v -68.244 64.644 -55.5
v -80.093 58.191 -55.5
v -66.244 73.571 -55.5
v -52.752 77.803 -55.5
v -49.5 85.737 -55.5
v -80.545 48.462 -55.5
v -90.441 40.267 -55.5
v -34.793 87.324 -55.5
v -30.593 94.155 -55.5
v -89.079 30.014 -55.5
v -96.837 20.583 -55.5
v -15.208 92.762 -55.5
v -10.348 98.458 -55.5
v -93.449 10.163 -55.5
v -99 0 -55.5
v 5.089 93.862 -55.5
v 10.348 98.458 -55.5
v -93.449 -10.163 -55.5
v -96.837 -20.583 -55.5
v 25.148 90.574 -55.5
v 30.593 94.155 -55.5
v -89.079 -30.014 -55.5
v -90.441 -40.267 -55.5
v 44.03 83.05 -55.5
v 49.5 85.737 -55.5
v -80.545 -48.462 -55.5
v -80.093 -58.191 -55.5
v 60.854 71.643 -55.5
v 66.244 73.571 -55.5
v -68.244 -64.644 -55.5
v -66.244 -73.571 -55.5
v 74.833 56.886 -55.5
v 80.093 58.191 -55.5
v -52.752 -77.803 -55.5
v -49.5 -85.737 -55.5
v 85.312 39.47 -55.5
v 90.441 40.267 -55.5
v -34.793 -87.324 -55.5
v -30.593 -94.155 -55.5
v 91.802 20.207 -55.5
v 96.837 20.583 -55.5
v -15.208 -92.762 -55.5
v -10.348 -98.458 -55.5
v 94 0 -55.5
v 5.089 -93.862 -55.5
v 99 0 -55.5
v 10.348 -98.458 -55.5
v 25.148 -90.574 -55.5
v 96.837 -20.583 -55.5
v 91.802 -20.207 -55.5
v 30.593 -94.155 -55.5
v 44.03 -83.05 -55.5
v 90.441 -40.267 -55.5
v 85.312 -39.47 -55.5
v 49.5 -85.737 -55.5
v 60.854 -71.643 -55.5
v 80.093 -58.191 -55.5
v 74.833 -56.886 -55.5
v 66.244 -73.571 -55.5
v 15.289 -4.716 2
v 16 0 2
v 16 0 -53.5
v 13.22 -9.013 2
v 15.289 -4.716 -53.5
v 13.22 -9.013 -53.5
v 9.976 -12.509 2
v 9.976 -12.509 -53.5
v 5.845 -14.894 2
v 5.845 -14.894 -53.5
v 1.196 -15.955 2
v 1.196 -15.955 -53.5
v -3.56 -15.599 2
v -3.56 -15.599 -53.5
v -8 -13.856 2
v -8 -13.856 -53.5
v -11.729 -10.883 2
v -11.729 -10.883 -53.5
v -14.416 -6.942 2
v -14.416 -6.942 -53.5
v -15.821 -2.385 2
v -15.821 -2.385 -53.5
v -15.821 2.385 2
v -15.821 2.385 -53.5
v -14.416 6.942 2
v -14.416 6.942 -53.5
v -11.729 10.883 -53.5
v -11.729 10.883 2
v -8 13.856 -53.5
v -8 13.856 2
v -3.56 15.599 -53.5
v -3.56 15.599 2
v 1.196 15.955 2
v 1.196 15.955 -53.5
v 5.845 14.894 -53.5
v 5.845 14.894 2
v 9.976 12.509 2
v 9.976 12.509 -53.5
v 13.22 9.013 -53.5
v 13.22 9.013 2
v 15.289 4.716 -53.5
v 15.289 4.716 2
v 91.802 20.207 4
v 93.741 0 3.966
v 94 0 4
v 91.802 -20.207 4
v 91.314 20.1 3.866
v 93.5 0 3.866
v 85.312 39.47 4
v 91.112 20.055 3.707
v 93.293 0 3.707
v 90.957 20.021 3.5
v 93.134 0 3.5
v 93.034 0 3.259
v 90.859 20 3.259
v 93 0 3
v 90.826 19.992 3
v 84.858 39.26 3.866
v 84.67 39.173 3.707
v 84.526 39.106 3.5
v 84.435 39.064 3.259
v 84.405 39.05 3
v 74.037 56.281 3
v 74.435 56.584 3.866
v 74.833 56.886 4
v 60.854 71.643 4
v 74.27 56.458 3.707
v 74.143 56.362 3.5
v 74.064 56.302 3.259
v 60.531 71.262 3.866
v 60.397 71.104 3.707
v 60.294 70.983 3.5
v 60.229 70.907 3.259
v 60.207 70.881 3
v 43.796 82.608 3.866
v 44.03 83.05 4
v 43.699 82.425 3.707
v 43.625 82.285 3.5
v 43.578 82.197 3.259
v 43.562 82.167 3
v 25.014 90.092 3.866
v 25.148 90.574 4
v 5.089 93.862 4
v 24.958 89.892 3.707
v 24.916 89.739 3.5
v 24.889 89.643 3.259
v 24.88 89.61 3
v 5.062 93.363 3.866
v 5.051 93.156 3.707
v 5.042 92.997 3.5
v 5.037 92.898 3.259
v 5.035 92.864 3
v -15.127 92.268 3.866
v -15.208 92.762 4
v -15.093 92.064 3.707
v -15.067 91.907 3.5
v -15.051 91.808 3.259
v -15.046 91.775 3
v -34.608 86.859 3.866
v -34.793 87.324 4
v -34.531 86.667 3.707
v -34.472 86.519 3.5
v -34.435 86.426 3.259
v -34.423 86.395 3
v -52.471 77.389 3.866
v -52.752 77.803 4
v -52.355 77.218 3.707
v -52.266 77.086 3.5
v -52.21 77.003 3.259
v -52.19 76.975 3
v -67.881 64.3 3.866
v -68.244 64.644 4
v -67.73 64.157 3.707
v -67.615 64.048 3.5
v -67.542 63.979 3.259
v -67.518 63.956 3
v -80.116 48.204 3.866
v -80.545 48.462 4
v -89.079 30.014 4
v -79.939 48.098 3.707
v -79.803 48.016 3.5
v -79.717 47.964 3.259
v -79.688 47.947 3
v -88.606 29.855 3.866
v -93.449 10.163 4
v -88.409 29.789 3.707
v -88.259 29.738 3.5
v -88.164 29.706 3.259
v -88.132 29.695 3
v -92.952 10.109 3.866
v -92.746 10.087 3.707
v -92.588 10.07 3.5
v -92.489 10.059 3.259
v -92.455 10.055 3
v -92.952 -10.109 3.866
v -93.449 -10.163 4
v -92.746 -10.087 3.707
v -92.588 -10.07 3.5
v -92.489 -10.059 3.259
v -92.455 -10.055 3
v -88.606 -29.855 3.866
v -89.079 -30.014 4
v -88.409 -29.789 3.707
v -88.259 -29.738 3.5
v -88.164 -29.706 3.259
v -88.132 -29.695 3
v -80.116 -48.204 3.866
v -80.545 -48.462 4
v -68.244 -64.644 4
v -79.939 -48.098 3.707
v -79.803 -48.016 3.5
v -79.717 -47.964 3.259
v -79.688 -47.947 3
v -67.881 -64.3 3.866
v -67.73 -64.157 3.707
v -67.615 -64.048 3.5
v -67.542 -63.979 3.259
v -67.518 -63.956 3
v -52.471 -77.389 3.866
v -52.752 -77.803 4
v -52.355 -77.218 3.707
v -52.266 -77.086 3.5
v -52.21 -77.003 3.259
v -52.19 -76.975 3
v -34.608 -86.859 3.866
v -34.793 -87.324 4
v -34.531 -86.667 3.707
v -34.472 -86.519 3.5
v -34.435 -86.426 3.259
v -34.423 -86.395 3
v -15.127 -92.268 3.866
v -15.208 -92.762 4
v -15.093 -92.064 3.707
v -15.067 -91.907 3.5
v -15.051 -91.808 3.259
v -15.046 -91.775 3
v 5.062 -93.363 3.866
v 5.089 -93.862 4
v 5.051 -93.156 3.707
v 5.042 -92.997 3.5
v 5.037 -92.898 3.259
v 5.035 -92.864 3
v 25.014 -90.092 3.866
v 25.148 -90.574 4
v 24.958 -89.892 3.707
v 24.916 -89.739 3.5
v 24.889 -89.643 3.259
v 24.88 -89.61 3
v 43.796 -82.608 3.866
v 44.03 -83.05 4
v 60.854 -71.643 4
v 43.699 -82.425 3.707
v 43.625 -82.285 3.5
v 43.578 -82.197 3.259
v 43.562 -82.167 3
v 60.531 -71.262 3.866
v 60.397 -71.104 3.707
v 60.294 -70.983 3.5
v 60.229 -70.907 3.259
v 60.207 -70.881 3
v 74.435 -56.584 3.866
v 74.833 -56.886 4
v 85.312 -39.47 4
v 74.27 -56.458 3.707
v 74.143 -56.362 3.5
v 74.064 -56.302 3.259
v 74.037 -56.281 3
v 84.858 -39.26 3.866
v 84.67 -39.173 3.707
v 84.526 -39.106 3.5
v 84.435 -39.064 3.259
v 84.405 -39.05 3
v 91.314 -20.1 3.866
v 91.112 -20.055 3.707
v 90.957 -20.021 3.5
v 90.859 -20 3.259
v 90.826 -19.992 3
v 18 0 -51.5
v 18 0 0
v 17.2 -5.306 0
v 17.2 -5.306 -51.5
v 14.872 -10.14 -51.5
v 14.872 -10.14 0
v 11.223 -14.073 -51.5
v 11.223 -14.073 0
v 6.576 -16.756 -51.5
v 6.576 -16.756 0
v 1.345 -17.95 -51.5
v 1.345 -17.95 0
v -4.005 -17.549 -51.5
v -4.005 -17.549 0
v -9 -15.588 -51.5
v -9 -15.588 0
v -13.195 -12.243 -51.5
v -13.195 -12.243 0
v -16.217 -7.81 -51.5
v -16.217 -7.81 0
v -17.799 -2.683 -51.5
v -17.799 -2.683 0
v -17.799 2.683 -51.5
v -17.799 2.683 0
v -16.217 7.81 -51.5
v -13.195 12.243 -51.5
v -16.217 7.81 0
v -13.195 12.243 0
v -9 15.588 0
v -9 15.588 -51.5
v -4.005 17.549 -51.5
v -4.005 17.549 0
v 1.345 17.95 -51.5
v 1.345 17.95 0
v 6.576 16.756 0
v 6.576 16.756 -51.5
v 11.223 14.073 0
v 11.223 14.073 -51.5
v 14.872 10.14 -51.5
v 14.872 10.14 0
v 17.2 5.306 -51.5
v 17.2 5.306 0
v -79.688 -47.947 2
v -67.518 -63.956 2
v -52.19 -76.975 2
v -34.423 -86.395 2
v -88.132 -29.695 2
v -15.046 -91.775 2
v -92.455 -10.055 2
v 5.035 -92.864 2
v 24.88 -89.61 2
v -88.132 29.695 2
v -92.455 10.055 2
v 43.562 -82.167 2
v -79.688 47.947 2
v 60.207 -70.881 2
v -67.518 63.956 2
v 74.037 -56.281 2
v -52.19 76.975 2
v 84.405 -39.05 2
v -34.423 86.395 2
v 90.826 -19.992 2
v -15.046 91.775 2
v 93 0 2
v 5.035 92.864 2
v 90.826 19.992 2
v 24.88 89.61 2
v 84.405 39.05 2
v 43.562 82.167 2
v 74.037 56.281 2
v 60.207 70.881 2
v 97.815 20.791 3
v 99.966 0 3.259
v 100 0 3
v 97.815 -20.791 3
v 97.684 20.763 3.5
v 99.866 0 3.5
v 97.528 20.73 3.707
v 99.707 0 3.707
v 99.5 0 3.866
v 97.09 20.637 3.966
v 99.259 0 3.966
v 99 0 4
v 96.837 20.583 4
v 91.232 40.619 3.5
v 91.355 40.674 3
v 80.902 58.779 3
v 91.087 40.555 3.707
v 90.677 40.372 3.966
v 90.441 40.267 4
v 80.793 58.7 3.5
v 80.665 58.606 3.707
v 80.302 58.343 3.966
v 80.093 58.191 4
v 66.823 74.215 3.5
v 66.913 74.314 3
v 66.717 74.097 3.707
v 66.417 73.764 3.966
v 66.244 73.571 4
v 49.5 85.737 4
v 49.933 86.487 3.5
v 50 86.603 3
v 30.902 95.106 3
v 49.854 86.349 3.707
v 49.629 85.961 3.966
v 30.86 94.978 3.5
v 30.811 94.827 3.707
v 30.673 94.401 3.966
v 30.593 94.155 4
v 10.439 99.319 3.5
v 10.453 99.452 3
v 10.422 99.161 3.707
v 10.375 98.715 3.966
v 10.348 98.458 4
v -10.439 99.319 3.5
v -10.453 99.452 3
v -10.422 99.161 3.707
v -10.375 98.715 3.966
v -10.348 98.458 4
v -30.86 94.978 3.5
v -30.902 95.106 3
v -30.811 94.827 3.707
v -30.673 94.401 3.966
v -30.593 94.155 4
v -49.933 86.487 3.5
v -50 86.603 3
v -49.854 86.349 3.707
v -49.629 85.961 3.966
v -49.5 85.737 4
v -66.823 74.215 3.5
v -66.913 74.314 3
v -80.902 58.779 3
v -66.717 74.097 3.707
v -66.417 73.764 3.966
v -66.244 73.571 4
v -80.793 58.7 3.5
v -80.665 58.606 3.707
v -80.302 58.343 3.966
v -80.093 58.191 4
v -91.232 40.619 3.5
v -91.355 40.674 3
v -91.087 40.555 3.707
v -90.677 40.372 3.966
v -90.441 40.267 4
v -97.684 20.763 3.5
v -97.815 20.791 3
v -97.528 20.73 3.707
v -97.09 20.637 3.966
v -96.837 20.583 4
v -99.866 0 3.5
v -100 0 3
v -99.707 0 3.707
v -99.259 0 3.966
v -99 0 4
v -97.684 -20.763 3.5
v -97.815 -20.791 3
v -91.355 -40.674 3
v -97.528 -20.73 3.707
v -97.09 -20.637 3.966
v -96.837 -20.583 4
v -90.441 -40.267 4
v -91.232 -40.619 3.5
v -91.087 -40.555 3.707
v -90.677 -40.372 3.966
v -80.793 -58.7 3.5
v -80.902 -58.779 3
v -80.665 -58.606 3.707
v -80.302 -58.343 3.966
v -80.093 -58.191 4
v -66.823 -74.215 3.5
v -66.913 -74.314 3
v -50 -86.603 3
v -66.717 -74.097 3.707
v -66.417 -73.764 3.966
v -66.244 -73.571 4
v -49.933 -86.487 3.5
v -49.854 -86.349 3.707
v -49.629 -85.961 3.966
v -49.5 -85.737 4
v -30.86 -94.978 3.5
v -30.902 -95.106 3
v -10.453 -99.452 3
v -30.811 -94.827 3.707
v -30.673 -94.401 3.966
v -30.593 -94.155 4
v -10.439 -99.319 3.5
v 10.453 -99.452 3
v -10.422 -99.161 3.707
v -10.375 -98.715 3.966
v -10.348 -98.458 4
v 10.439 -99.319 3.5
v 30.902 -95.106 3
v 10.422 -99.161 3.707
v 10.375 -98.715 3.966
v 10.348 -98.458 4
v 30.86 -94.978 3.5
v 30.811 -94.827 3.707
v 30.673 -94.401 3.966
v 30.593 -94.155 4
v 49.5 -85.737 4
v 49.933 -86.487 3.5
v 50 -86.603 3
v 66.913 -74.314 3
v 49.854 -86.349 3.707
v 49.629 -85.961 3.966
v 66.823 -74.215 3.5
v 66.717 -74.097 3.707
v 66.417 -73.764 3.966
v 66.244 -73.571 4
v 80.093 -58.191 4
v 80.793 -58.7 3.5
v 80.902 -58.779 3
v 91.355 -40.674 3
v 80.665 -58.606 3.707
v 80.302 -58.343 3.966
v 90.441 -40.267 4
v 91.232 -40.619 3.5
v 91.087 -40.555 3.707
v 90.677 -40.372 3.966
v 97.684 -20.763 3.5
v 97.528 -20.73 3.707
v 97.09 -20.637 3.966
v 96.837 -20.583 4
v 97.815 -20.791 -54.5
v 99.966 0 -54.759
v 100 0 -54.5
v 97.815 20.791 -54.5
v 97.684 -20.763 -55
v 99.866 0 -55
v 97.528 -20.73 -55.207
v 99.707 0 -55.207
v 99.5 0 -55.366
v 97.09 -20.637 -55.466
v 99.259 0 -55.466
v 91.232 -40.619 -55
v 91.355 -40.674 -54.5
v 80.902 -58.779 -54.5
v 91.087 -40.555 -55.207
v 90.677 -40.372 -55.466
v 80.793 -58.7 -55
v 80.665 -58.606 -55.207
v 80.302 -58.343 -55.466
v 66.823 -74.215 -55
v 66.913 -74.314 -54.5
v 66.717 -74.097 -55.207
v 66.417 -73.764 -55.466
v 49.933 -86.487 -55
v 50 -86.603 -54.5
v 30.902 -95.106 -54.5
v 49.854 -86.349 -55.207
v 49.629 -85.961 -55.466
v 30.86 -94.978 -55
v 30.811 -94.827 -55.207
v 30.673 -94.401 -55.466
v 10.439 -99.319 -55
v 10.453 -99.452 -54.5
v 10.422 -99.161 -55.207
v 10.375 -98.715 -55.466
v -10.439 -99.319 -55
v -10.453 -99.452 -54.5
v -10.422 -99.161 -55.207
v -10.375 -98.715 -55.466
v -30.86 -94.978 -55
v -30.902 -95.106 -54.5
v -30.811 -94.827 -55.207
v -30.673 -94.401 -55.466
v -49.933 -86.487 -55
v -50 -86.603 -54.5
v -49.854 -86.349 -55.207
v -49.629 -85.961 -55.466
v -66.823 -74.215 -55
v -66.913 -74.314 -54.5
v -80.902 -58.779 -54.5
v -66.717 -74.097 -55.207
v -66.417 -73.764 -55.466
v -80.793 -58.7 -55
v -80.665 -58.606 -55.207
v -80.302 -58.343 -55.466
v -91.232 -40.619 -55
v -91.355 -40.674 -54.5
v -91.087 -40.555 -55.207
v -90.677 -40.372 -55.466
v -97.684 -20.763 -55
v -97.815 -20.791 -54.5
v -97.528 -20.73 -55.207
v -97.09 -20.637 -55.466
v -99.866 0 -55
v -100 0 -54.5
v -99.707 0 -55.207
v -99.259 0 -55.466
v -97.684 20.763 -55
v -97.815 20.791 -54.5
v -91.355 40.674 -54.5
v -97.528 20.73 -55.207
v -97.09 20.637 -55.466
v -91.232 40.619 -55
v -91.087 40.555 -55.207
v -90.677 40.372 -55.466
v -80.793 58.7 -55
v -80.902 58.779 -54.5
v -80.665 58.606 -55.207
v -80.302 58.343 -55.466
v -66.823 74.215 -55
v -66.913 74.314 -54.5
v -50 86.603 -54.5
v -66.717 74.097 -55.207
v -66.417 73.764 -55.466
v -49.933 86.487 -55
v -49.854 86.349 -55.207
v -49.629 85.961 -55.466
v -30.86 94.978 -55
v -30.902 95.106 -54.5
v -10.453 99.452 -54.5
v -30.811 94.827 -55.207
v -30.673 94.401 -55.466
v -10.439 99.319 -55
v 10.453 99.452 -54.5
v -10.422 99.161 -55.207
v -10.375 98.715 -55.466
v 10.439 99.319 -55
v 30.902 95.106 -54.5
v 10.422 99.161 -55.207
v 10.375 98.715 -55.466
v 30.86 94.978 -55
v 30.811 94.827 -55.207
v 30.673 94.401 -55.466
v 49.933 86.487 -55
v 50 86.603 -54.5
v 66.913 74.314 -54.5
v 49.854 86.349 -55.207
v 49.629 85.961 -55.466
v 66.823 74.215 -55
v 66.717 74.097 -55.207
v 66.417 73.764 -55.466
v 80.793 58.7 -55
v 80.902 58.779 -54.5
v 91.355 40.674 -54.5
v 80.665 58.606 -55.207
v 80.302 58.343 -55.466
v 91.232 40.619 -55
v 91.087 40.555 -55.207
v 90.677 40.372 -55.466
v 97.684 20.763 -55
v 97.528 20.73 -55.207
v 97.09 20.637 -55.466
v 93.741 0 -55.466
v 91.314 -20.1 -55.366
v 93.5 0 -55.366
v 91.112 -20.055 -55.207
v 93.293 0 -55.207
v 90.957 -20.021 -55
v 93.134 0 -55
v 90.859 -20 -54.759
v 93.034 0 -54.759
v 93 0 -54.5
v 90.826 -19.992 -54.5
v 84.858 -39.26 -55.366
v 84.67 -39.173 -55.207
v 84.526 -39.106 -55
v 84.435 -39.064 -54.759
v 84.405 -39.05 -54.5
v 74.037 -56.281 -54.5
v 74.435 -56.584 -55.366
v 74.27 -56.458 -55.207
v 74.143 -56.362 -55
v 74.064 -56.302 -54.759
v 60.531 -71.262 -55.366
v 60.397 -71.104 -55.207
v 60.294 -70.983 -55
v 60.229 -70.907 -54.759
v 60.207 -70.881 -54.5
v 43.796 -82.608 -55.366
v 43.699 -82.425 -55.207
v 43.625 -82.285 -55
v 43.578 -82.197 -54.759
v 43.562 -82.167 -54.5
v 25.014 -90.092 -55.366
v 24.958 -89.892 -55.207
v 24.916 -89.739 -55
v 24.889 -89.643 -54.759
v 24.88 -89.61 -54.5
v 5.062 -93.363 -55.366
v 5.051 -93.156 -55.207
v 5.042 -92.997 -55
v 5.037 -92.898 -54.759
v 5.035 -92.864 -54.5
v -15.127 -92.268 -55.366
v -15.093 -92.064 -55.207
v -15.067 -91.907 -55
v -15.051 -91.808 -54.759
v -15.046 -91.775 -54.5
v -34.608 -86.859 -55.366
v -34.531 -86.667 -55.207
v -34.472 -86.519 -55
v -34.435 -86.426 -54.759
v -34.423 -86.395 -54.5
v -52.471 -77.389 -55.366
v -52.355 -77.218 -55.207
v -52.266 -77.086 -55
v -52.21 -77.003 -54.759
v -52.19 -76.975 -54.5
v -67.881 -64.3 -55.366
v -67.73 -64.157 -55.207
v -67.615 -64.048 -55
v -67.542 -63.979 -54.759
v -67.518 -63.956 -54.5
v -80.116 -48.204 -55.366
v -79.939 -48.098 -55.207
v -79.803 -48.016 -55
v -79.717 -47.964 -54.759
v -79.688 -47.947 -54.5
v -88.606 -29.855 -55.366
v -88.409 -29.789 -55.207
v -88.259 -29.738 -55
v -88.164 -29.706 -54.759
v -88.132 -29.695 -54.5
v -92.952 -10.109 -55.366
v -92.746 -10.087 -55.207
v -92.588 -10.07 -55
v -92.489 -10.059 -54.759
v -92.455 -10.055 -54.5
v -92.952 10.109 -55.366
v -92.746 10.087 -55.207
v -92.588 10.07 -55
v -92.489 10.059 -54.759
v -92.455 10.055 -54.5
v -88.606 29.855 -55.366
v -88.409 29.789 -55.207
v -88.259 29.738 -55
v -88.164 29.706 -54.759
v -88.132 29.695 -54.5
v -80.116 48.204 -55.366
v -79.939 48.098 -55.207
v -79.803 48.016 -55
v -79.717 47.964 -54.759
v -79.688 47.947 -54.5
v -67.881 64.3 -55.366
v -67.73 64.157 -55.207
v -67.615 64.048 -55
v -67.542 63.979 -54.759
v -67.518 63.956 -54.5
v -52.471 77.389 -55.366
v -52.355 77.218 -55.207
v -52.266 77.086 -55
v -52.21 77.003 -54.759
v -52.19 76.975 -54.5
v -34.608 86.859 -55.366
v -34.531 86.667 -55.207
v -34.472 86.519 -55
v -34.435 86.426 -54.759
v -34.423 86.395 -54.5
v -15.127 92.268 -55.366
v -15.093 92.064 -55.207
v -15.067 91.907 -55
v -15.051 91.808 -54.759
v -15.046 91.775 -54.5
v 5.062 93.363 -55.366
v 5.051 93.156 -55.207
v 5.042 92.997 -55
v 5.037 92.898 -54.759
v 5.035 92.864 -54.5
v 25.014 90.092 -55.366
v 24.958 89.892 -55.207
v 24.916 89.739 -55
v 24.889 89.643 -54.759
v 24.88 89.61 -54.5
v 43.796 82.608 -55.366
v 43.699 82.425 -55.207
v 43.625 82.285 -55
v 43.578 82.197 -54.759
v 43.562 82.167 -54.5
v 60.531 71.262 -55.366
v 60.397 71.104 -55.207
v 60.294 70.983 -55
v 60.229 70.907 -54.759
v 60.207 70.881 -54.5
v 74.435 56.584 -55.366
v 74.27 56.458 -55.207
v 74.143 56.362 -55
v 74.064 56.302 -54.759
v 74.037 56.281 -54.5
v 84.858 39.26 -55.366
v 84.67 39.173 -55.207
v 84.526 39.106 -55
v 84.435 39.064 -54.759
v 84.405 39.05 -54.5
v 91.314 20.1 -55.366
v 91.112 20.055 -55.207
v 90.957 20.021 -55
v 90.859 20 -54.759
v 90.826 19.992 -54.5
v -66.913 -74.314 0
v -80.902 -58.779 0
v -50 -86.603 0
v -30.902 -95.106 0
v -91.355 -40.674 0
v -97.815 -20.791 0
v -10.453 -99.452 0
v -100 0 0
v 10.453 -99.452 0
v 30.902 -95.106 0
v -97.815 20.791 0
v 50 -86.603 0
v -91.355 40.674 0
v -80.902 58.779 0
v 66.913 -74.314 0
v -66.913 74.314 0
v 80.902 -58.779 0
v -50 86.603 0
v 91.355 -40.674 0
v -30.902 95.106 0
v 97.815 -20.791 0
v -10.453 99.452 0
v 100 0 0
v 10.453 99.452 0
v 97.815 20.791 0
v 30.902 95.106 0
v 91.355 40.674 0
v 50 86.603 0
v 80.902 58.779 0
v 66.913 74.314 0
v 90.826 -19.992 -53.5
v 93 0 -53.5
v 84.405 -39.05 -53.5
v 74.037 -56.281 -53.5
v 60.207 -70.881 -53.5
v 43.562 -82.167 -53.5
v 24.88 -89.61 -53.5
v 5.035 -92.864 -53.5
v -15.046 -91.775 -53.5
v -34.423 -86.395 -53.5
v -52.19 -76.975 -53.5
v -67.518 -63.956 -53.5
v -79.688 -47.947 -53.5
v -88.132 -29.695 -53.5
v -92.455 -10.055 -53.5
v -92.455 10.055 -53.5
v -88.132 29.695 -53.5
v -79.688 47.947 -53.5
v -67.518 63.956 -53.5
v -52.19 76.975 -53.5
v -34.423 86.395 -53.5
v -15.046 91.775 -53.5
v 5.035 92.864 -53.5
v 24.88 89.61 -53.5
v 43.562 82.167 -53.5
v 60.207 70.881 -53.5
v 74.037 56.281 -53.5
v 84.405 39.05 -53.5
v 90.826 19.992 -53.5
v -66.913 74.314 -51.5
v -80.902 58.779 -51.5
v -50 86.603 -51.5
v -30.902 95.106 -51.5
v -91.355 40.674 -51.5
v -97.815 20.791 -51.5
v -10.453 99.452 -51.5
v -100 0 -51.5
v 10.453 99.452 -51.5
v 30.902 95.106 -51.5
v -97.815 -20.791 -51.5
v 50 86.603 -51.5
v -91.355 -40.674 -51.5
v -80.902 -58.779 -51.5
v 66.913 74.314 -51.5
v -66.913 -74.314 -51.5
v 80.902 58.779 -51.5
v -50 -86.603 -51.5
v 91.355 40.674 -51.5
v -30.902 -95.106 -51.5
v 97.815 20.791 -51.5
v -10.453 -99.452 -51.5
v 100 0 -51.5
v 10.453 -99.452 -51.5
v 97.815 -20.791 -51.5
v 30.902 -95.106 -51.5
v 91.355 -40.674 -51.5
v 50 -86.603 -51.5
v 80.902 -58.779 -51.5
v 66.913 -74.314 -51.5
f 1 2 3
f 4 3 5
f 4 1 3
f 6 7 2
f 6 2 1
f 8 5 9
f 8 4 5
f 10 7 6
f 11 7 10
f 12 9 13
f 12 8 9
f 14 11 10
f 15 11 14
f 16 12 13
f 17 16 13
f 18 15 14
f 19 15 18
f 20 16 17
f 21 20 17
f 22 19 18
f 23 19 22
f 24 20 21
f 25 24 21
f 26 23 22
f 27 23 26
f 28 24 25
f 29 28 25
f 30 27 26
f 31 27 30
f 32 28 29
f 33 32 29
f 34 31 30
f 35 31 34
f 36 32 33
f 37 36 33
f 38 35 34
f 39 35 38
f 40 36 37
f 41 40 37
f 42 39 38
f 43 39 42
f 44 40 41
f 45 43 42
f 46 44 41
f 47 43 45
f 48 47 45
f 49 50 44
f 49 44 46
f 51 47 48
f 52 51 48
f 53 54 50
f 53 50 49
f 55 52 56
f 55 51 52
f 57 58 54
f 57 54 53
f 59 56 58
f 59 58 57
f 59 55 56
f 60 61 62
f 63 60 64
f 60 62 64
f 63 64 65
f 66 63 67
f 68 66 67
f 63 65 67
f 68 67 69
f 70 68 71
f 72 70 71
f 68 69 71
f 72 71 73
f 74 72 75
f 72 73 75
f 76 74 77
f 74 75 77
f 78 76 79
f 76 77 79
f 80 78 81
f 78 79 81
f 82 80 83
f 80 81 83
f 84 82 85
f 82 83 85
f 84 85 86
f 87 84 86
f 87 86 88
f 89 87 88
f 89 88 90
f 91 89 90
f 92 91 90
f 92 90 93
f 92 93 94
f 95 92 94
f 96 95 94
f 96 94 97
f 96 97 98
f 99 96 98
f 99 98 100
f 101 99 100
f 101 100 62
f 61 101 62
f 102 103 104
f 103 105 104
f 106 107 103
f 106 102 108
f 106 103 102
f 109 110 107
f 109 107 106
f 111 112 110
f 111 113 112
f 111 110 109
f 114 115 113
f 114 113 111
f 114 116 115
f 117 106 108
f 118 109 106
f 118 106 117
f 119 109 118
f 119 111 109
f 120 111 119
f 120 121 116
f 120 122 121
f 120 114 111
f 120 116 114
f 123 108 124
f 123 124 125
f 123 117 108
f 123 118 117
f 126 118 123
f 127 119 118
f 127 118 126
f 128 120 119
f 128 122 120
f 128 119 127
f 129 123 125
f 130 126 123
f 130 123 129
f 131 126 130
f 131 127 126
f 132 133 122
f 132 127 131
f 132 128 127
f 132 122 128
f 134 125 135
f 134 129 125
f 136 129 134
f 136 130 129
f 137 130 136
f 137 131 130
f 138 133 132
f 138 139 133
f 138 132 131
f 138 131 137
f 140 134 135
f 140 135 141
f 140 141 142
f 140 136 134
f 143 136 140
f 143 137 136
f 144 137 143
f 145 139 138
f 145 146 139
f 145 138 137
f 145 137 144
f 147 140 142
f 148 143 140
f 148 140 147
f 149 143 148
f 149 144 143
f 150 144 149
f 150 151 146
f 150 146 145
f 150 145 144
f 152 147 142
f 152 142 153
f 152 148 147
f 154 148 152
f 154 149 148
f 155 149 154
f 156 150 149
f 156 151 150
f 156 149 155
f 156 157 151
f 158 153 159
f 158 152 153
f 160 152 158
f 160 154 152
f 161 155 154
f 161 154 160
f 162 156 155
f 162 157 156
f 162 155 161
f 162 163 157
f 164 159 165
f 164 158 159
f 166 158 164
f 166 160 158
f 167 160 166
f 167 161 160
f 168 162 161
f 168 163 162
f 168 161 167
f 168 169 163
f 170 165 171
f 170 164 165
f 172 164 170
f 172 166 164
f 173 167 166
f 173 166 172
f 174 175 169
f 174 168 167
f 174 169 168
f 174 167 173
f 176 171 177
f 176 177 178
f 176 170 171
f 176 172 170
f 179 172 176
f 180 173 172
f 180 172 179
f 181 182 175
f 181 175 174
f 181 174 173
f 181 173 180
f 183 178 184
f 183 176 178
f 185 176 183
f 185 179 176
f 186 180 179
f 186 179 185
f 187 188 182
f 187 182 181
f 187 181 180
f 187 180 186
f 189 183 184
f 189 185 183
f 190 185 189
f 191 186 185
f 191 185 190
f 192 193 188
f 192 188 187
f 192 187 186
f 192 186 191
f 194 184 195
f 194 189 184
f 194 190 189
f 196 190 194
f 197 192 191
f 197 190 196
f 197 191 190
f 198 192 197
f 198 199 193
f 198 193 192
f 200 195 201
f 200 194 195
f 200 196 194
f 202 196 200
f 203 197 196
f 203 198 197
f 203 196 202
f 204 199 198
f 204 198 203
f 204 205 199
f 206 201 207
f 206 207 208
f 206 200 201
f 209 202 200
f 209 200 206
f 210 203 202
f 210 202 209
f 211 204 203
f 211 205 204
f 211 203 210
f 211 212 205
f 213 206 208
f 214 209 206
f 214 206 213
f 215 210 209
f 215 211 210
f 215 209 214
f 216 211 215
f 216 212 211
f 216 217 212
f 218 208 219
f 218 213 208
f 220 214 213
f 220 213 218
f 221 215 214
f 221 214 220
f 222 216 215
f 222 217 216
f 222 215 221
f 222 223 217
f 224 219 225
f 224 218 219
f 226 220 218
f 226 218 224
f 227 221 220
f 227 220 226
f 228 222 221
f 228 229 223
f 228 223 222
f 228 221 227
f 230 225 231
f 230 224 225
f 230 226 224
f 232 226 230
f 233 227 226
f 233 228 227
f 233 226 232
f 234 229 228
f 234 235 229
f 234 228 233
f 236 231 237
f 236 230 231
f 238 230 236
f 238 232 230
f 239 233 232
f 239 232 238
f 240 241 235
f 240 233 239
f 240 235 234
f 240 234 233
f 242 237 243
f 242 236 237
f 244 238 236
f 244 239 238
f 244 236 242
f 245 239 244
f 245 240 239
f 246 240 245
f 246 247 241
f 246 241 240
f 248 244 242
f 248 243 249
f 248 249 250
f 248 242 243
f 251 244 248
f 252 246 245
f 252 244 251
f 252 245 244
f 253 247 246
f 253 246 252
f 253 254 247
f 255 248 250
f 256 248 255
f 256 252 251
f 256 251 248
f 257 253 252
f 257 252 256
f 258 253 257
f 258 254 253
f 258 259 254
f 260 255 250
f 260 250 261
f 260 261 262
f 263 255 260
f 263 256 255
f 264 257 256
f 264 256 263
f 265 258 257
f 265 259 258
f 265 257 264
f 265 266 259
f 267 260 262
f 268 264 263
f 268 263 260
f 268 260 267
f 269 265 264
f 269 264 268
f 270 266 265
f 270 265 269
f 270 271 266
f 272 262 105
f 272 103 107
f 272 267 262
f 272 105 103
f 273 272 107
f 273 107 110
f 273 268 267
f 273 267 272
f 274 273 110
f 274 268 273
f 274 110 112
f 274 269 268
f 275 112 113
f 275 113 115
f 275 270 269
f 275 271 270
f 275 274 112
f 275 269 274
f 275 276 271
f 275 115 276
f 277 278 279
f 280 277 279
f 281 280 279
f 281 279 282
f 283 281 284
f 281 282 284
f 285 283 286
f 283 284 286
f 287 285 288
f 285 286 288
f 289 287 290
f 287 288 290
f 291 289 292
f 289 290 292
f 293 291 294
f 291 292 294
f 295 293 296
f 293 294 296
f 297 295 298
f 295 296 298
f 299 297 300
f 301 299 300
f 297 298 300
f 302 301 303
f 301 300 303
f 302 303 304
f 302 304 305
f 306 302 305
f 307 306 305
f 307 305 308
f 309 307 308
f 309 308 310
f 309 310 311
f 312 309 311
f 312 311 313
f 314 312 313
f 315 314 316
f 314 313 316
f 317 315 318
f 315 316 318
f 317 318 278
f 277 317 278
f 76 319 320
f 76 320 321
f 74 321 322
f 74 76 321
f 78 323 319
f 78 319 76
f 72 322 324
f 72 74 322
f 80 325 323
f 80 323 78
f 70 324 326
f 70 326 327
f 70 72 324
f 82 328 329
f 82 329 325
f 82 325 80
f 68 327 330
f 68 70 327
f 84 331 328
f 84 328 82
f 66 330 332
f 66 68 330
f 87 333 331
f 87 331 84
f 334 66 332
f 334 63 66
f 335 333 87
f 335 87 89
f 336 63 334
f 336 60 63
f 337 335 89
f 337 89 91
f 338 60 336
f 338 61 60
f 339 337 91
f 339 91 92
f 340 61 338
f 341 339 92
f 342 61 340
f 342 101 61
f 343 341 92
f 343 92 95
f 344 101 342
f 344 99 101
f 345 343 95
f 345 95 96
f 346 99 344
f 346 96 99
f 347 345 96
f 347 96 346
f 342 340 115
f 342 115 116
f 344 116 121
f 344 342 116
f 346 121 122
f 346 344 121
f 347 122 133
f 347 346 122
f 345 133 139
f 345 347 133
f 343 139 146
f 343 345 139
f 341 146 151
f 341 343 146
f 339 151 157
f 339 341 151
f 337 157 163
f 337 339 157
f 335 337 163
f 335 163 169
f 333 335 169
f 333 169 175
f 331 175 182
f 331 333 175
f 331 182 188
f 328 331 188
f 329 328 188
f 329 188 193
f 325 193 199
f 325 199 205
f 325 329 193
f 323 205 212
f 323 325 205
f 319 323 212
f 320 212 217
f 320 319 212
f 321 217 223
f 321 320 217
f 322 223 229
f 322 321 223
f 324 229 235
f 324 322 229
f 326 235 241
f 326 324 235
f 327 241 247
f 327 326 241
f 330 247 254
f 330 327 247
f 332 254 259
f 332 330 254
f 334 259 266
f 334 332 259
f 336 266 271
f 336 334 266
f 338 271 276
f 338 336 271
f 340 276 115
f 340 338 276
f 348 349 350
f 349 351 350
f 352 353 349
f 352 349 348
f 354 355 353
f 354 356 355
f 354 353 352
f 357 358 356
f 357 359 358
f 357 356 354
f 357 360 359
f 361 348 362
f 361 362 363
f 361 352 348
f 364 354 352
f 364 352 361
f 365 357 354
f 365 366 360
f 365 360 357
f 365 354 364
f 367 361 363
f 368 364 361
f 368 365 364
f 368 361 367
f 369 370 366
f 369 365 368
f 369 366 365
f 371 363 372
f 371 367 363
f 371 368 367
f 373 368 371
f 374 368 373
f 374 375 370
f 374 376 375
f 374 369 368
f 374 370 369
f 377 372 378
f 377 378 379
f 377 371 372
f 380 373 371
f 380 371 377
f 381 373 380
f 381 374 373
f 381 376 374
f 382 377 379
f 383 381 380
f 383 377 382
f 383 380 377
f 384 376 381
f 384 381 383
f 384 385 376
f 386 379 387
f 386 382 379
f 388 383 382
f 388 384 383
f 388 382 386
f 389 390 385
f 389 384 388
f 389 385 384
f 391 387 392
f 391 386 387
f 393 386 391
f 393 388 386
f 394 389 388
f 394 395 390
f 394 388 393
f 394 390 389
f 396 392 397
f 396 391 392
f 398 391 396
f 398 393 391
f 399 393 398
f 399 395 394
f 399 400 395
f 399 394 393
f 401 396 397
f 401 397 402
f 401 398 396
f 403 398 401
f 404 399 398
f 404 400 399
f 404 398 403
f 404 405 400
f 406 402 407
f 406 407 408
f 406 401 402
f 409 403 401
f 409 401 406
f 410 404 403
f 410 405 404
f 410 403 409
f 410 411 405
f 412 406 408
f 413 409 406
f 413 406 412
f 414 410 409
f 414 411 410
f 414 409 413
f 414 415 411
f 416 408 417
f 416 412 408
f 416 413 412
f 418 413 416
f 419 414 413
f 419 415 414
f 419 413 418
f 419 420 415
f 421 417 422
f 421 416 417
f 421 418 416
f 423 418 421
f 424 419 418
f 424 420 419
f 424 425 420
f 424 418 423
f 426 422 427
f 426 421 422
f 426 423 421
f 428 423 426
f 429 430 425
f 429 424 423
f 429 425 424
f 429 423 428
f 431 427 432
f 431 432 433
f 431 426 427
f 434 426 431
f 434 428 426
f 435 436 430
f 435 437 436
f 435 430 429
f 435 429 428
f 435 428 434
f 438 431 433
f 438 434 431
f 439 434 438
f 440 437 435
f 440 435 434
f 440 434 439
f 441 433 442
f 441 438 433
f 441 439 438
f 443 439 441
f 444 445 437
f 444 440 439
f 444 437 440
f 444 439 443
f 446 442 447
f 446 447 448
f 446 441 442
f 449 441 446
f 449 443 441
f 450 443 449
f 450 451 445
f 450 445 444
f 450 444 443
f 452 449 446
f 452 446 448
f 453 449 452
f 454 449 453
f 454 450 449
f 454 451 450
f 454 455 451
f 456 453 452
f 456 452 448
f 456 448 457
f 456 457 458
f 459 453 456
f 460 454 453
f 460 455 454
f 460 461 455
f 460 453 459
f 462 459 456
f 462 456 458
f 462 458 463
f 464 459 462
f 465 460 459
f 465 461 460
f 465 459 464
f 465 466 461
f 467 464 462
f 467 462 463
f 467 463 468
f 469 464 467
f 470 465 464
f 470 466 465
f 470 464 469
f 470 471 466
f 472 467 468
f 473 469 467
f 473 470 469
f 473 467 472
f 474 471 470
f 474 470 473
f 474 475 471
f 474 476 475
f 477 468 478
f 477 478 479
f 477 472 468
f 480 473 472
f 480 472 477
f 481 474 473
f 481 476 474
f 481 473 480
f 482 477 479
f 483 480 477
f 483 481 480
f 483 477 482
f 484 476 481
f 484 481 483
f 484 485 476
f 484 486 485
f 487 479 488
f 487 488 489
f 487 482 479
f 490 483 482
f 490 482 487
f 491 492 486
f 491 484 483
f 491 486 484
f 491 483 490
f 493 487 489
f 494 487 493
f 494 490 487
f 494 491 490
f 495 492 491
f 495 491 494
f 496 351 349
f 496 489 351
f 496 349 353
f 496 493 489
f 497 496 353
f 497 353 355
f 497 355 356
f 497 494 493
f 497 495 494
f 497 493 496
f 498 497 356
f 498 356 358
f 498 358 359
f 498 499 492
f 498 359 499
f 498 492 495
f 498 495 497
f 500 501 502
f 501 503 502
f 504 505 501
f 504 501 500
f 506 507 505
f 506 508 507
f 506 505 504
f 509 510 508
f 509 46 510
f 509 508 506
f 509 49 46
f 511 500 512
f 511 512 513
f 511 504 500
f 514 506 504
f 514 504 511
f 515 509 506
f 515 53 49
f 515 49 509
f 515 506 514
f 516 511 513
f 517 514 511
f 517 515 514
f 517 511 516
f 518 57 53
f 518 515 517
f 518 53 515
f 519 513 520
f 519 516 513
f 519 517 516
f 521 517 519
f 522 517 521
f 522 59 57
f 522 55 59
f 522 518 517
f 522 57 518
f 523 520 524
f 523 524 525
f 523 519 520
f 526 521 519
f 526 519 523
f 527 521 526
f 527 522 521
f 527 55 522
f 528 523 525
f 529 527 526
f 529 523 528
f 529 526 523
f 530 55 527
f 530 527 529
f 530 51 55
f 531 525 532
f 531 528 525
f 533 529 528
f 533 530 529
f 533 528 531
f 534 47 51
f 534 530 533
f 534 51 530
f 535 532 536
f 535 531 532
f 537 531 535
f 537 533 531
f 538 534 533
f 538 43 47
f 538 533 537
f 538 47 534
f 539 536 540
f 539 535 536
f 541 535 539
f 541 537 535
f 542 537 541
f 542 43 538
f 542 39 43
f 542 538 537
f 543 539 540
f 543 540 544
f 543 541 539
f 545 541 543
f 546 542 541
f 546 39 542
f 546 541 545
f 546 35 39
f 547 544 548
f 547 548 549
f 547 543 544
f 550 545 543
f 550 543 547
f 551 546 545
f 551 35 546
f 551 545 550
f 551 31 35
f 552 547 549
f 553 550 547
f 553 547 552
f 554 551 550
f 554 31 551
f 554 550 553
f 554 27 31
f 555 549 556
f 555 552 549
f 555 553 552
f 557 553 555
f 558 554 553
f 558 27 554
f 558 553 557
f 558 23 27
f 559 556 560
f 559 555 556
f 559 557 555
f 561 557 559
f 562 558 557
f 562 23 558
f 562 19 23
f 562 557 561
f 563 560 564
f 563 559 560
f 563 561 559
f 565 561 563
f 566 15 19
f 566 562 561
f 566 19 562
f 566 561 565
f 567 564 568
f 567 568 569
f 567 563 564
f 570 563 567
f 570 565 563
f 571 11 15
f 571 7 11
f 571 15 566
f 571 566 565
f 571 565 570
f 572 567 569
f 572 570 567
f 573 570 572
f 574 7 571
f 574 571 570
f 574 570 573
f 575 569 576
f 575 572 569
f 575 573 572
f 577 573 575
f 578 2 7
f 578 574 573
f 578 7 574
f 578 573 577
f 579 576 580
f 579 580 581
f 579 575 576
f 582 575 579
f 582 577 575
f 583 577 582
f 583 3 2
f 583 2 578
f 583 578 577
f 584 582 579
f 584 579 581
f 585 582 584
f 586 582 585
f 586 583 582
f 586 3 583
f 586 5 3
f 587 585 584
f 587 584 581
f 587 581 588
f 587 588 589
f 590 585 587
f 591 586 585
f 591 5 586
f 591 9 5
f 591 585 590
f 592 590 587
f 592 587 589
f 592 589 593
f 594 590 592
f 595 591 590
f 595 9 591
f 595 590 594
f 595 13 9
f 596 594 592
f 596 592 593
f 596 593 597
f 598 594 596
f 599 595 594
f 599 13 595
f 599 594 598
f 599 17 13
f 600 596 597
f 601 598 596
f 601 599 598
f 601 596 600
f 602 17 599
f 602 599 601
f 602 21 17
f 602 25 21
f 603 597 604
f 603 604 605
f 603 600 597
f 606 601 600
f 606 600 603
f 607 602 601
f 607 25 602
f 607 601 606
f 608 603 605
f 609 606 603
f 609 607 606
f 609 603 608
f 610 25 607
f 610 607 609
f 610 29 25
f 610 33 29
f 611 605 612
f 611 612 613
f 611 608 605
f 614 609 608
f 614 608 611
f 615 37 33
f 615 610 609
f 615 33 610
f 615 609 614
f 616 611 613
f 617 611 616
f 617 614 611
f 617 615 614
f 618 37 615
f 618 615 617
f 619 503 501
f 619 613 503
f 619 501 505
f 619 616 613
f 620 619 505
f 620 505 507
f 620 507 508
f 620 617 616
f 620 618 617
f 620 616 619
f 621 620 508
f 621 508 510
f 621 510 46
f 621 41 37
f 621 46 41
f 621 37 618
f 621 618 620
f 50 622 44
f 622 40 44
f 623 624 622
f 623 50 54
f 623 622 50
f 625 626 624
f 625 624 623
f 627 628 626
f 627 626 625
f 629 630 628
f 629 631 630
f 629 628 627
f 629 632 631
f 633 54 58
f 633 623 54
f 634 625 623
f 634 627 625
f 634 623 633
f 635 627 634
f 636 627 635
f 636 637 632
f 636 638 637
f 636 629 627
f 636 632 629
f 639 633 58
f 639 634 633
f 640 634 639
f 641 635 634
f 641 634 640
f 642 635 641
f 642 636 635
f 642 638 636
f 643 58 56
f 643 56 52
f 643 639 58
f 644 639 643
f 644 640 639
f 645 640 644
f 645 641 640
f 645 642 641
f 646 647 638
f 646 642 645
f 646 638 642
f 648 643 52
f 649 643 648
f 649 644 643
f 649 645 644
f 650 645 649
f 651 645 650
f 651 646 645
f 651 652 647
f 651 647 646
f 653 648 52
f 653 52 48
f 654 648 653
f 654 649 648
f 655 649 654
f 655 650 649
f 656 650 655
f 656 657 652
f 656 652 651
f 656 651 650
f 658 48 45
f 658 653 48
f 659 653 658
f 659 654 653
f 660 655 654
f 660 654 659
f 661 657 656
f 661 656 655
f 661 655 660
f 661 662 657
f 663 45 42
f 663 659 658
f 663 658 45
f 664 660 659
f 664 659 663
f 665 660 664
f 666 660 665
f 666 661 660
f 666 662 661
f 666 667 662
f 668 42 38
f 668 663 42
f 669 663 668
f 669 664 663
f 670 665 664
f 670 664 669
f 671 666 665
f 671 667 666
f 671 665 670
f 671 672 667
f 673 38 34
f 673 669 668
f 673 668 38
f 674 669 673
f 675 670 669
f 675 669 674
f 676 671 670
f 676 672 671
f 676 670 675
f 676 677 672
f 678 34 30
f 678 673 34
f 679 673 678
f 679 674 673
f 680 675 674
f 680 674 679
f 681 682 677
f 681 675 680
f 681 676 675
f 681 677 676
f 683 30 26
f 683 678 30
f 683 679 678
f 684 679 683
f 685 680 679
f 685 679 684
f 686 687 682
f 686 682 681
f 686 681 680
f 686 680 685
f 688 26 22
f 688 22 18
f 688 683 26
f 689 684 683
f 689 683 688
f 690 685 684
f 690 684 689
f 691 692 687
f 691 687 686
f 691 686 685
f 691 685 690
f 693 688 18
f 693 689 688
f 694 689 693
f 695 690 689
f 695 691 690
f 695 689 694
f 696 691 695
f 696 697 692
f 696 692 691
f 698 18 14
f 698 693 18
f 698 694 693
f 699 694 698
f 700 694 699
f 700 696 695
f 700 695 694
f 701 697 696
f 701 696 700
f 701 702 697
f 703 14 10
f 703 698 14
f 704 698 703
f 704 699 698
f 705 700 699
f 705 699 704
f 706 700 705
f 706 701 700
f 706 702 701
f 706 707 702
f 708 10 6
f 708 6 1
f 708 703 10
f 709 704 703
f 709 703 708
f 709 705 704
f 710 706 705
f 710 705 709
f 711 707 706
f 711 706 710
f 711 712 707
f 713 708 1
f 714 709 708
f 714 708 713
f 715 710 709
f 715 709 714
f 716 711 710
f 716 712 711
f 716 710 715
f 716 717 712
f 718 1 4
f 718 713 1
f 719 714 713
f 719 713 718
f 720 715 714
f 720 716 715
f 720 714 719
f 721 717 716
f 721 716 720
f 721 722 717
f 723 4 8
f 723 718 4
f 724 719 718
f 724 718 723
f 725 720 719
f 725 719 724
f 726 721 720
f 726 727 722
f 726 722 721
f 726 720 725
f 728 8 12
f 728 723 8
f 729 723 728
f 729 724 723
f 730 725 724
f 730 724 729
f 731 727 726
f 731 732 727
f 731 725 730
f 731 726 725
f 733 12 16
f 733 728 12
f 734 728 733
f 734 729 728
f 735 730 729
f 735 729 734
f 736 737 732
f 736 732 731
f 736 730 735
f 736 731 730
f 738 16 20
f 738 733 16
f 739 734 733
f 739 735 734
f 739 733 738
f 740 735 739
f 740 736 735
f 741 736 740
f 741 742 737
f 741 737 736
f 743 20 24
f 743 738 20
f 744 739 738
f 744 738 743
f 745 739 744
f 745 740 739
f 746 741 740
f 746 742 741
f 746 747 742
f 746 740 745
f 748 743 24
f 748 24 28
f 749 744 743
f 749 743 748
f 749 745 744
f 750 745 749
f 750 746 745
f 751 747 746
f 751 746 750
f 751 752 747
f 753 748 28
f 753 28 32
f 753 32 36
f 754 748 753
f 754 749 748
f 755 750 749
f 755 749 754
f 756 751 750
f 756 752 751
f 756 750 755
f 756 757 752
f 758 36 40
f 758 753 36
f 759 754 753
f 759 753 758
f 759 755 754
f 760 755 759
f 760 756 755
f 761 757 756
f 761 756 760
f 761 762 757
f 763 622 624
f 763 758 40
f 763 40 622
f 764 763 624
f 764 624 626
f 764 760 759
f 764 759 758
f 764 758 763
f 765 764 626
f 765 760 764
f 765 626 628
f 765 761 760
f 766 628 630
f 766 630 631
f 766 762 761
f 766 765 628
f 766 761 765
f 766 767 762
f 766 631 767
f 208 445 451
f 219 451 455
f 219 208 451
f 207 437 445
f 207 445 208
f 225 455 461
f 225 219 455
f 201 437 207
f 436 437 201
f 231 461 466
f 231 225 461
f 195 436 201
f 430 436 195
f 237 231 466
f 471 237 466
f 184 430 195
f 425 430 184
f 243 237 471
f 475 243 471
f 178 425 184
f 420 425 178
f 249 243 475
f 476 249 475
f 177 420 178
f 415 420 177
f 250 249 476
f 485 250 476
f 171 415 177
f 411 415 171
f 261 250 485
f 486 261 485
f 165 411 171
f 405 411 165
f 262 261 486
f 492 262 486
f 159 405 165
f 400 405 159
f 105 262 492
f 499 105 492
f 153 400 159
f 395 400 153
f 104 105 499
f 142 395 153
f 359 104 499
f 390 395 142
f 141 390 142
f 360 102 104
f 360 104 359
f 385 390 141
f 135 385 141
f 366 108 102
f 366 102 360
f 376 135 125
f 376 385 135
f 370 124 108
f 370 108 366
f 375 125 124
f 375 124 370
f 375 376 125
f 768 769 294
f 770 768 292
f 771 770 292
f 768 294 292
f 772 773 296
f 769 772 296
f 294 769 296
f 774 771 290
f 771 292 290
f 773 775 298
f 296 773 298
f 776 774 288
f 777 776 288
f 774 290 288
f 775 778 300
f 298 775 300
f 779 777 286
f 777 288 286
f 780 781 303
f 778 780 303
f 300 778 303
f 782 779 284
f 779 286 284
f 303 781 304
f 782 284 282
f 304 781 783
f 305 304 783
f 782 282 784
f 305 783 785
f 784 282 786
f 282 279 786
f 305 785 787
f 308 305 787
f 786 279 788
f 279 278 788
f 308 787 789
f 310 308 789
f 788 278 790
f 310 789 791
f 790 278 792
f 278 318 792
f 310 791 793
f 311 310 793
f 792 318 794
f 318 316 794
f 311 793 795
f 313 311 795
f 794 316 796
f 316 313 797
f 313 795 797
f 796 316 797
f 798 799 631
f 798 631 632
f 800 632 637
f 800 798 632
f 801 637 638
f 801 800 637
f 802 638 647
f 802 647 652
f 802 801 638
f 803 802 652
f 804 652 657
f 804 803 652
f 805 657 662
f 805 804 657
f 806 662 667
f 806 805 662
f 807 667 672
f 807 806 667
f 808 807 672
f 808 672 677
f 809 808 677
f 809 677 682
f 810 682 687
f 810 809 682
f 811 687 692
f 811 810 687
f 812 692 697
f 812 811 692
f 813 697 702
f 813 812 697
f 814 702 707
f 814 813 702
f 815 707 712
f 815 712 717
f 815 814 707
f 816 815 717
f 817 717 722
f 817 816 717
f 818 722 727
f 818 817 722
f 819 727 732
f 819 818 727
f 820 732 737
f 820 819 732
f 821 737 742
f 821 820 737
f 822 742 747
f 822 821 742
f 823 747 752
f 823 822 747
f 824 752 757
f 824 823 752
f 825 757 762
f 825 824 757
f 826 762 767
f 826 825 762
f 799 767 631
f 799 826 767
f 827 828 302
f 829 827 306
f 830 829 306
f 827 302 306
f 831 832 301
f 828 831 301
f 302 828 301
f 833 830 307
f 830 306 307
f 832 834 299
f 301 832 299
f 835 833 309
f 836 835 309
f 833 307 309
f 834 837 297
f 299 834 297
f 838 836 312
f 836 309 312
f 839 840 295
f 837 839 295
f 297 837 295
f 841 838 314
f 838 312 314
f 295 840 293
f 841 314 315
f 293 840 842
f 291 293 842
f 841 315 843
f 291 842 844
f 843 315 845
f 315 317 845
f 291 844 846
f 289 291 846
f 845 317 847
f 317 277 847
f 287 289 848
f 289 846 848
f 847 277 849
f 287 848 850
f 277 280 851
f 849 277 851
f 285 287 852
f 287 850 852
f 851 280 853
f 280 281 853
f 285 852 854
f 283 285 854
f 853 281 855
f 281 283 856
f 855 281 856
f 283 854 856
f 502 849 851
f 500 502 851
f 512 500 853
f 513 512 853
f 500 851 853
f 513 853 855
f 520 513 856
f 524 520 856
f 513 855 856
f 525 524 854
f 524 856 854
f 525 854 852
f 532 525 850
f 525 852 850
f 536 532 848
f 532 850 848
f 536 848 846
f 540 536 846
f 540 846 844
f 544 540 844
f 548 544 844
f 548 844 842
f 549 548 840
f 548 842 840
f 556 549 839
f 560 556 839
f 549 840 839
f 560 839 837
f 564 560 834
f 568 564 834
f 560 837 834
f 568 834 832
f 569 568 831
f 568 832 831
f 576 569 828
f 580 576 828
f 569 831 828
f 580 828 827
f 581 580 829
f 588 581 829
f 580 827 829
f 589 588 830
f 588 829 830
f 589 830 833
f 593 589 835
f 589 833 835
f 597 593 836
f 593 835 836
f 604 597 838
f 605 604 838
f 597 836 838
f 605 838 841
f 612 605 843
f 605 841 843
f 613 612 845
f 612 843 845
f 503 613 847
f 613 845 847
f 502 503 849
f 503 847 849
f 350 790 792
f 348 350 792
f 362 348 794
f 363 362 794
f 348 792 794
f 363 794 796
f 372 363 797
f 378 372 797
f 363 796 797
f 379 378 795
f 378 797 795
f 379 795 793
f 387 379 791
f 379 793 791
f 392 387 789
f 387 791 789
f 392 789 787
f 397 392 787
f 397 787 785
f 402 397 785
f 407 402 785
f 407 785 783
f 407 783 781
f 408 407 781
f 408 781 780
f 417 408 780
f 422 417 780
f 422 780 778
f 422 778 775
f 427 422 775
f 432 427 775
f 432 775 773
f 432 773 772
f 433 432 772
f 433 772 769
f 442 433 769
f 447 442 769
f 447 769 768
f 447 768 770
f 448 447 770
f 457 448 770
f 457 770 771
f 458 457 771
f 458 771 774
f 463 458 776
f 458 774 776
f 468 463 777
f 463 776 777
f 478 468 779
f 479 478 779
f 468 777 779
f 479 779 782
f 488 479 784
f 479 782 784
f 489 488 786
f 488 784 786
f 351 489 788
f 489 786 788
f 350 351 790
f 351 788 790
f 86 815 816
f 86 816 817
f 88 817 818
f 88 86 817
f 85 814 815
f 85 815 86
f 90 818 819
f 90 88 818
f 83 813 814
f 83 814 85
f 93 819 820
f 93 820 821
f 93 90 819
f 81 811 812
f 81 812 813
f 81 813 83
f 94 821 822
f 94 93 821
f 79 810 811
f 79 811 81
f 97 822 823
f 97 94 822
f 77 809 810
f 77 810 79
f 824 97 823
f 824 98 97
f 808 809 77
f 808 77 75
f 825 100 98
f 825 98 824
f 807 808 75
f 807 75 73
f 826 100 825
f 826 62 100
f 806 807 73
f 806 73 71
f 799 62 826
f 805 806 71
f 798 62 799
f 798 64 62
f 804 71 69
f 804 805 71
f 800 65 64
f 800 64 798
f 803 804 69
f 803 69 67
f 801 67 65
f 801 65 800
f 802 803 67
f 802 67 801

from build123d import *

# Parameters (mm, degrees)
F0_R      = 100
F1_DEPTH  = 2
F2_R      = 100
F2_R_2    = 93
F3_DEPTH  = 2
F4_R      = 18
F5_DEPTH  = 51.5
F6_R      = 100
F7_DEPTH  = 2
F8_R      = 100
F8_R_2    = 93
F9_DEPTH  = 2
F10_R     = 1
F11_R     = 16
F12_DEPTH = 69


with BuildPart() as f1:
    # F0 (on Top) → F1 (new body)
    with BuildSketch(Plane.XY):
        Circle(F0_R)
    extrude(amount=F1_DEPTH)

    # F4 (on face) → F5 (join)
    with BuildSketch(Plane(origin=(0, 0, 0), x_dir=(1, 0, 0), z_dir=(0, 0, -1))):
        Circle(F4_R)
    extrude(amount=F5_DEPTH)



with BuildPart() as f3:
    # F2 (on face) → F3 (new body)
    with BuildSketch(Plane(origin=(0, 0, -53.5), x_dir=(1, 0, 0), z_dir=(0, 0, -1))):
        Circle(F2_R)
        Circle(F2_R_2, mode=Mode.SUBTRACT)
    extrude(amount=F3_DEPTH)


with BuildPart() as f1_1:
    add(f1.part)

    add(f3.part)  # F7 merges F3
    # F6 (on face) → F7 (join)
    with BuildSketch(Plane(origin=(0, 0, -51.5), x_dir=(1, 0, 0), z_dir=(0, 0, -1))):
        Circle(F6_R)
    extrude(amount=F7_DEPTH)

    # F8 (on face) → F9 (join)
    with BuildSketch(Plane.XY.offset(2)):
        Circle(F8_R)
        Circle(F8_R_2, mode=Mode.SUBTRACT)
    extrude(amount=F9_DEPTH)

    # F10
    f10_edges = [f1_1.edges().sort_by_distance(p)[0] for p in [
        (-93, 0, -55.5),
        (-100, 0, -55.5),
        (-93, 0, 4),
        (-100, 0, 4),
    ]]
    fillet(f10_edges, radius=F10_R)

    # F11 (on face) → F12 (cut)
    with BuildSketch(Plane(origin=(0, 0, -53.5), x_dir=(1, 0, 0), z_dir=(0, 0, -1))):
        Circle(F11_R)
    extrude(amount=-F12_DEPTH, mode=Mode.SUBTRACT)


solid = f1_1.part
